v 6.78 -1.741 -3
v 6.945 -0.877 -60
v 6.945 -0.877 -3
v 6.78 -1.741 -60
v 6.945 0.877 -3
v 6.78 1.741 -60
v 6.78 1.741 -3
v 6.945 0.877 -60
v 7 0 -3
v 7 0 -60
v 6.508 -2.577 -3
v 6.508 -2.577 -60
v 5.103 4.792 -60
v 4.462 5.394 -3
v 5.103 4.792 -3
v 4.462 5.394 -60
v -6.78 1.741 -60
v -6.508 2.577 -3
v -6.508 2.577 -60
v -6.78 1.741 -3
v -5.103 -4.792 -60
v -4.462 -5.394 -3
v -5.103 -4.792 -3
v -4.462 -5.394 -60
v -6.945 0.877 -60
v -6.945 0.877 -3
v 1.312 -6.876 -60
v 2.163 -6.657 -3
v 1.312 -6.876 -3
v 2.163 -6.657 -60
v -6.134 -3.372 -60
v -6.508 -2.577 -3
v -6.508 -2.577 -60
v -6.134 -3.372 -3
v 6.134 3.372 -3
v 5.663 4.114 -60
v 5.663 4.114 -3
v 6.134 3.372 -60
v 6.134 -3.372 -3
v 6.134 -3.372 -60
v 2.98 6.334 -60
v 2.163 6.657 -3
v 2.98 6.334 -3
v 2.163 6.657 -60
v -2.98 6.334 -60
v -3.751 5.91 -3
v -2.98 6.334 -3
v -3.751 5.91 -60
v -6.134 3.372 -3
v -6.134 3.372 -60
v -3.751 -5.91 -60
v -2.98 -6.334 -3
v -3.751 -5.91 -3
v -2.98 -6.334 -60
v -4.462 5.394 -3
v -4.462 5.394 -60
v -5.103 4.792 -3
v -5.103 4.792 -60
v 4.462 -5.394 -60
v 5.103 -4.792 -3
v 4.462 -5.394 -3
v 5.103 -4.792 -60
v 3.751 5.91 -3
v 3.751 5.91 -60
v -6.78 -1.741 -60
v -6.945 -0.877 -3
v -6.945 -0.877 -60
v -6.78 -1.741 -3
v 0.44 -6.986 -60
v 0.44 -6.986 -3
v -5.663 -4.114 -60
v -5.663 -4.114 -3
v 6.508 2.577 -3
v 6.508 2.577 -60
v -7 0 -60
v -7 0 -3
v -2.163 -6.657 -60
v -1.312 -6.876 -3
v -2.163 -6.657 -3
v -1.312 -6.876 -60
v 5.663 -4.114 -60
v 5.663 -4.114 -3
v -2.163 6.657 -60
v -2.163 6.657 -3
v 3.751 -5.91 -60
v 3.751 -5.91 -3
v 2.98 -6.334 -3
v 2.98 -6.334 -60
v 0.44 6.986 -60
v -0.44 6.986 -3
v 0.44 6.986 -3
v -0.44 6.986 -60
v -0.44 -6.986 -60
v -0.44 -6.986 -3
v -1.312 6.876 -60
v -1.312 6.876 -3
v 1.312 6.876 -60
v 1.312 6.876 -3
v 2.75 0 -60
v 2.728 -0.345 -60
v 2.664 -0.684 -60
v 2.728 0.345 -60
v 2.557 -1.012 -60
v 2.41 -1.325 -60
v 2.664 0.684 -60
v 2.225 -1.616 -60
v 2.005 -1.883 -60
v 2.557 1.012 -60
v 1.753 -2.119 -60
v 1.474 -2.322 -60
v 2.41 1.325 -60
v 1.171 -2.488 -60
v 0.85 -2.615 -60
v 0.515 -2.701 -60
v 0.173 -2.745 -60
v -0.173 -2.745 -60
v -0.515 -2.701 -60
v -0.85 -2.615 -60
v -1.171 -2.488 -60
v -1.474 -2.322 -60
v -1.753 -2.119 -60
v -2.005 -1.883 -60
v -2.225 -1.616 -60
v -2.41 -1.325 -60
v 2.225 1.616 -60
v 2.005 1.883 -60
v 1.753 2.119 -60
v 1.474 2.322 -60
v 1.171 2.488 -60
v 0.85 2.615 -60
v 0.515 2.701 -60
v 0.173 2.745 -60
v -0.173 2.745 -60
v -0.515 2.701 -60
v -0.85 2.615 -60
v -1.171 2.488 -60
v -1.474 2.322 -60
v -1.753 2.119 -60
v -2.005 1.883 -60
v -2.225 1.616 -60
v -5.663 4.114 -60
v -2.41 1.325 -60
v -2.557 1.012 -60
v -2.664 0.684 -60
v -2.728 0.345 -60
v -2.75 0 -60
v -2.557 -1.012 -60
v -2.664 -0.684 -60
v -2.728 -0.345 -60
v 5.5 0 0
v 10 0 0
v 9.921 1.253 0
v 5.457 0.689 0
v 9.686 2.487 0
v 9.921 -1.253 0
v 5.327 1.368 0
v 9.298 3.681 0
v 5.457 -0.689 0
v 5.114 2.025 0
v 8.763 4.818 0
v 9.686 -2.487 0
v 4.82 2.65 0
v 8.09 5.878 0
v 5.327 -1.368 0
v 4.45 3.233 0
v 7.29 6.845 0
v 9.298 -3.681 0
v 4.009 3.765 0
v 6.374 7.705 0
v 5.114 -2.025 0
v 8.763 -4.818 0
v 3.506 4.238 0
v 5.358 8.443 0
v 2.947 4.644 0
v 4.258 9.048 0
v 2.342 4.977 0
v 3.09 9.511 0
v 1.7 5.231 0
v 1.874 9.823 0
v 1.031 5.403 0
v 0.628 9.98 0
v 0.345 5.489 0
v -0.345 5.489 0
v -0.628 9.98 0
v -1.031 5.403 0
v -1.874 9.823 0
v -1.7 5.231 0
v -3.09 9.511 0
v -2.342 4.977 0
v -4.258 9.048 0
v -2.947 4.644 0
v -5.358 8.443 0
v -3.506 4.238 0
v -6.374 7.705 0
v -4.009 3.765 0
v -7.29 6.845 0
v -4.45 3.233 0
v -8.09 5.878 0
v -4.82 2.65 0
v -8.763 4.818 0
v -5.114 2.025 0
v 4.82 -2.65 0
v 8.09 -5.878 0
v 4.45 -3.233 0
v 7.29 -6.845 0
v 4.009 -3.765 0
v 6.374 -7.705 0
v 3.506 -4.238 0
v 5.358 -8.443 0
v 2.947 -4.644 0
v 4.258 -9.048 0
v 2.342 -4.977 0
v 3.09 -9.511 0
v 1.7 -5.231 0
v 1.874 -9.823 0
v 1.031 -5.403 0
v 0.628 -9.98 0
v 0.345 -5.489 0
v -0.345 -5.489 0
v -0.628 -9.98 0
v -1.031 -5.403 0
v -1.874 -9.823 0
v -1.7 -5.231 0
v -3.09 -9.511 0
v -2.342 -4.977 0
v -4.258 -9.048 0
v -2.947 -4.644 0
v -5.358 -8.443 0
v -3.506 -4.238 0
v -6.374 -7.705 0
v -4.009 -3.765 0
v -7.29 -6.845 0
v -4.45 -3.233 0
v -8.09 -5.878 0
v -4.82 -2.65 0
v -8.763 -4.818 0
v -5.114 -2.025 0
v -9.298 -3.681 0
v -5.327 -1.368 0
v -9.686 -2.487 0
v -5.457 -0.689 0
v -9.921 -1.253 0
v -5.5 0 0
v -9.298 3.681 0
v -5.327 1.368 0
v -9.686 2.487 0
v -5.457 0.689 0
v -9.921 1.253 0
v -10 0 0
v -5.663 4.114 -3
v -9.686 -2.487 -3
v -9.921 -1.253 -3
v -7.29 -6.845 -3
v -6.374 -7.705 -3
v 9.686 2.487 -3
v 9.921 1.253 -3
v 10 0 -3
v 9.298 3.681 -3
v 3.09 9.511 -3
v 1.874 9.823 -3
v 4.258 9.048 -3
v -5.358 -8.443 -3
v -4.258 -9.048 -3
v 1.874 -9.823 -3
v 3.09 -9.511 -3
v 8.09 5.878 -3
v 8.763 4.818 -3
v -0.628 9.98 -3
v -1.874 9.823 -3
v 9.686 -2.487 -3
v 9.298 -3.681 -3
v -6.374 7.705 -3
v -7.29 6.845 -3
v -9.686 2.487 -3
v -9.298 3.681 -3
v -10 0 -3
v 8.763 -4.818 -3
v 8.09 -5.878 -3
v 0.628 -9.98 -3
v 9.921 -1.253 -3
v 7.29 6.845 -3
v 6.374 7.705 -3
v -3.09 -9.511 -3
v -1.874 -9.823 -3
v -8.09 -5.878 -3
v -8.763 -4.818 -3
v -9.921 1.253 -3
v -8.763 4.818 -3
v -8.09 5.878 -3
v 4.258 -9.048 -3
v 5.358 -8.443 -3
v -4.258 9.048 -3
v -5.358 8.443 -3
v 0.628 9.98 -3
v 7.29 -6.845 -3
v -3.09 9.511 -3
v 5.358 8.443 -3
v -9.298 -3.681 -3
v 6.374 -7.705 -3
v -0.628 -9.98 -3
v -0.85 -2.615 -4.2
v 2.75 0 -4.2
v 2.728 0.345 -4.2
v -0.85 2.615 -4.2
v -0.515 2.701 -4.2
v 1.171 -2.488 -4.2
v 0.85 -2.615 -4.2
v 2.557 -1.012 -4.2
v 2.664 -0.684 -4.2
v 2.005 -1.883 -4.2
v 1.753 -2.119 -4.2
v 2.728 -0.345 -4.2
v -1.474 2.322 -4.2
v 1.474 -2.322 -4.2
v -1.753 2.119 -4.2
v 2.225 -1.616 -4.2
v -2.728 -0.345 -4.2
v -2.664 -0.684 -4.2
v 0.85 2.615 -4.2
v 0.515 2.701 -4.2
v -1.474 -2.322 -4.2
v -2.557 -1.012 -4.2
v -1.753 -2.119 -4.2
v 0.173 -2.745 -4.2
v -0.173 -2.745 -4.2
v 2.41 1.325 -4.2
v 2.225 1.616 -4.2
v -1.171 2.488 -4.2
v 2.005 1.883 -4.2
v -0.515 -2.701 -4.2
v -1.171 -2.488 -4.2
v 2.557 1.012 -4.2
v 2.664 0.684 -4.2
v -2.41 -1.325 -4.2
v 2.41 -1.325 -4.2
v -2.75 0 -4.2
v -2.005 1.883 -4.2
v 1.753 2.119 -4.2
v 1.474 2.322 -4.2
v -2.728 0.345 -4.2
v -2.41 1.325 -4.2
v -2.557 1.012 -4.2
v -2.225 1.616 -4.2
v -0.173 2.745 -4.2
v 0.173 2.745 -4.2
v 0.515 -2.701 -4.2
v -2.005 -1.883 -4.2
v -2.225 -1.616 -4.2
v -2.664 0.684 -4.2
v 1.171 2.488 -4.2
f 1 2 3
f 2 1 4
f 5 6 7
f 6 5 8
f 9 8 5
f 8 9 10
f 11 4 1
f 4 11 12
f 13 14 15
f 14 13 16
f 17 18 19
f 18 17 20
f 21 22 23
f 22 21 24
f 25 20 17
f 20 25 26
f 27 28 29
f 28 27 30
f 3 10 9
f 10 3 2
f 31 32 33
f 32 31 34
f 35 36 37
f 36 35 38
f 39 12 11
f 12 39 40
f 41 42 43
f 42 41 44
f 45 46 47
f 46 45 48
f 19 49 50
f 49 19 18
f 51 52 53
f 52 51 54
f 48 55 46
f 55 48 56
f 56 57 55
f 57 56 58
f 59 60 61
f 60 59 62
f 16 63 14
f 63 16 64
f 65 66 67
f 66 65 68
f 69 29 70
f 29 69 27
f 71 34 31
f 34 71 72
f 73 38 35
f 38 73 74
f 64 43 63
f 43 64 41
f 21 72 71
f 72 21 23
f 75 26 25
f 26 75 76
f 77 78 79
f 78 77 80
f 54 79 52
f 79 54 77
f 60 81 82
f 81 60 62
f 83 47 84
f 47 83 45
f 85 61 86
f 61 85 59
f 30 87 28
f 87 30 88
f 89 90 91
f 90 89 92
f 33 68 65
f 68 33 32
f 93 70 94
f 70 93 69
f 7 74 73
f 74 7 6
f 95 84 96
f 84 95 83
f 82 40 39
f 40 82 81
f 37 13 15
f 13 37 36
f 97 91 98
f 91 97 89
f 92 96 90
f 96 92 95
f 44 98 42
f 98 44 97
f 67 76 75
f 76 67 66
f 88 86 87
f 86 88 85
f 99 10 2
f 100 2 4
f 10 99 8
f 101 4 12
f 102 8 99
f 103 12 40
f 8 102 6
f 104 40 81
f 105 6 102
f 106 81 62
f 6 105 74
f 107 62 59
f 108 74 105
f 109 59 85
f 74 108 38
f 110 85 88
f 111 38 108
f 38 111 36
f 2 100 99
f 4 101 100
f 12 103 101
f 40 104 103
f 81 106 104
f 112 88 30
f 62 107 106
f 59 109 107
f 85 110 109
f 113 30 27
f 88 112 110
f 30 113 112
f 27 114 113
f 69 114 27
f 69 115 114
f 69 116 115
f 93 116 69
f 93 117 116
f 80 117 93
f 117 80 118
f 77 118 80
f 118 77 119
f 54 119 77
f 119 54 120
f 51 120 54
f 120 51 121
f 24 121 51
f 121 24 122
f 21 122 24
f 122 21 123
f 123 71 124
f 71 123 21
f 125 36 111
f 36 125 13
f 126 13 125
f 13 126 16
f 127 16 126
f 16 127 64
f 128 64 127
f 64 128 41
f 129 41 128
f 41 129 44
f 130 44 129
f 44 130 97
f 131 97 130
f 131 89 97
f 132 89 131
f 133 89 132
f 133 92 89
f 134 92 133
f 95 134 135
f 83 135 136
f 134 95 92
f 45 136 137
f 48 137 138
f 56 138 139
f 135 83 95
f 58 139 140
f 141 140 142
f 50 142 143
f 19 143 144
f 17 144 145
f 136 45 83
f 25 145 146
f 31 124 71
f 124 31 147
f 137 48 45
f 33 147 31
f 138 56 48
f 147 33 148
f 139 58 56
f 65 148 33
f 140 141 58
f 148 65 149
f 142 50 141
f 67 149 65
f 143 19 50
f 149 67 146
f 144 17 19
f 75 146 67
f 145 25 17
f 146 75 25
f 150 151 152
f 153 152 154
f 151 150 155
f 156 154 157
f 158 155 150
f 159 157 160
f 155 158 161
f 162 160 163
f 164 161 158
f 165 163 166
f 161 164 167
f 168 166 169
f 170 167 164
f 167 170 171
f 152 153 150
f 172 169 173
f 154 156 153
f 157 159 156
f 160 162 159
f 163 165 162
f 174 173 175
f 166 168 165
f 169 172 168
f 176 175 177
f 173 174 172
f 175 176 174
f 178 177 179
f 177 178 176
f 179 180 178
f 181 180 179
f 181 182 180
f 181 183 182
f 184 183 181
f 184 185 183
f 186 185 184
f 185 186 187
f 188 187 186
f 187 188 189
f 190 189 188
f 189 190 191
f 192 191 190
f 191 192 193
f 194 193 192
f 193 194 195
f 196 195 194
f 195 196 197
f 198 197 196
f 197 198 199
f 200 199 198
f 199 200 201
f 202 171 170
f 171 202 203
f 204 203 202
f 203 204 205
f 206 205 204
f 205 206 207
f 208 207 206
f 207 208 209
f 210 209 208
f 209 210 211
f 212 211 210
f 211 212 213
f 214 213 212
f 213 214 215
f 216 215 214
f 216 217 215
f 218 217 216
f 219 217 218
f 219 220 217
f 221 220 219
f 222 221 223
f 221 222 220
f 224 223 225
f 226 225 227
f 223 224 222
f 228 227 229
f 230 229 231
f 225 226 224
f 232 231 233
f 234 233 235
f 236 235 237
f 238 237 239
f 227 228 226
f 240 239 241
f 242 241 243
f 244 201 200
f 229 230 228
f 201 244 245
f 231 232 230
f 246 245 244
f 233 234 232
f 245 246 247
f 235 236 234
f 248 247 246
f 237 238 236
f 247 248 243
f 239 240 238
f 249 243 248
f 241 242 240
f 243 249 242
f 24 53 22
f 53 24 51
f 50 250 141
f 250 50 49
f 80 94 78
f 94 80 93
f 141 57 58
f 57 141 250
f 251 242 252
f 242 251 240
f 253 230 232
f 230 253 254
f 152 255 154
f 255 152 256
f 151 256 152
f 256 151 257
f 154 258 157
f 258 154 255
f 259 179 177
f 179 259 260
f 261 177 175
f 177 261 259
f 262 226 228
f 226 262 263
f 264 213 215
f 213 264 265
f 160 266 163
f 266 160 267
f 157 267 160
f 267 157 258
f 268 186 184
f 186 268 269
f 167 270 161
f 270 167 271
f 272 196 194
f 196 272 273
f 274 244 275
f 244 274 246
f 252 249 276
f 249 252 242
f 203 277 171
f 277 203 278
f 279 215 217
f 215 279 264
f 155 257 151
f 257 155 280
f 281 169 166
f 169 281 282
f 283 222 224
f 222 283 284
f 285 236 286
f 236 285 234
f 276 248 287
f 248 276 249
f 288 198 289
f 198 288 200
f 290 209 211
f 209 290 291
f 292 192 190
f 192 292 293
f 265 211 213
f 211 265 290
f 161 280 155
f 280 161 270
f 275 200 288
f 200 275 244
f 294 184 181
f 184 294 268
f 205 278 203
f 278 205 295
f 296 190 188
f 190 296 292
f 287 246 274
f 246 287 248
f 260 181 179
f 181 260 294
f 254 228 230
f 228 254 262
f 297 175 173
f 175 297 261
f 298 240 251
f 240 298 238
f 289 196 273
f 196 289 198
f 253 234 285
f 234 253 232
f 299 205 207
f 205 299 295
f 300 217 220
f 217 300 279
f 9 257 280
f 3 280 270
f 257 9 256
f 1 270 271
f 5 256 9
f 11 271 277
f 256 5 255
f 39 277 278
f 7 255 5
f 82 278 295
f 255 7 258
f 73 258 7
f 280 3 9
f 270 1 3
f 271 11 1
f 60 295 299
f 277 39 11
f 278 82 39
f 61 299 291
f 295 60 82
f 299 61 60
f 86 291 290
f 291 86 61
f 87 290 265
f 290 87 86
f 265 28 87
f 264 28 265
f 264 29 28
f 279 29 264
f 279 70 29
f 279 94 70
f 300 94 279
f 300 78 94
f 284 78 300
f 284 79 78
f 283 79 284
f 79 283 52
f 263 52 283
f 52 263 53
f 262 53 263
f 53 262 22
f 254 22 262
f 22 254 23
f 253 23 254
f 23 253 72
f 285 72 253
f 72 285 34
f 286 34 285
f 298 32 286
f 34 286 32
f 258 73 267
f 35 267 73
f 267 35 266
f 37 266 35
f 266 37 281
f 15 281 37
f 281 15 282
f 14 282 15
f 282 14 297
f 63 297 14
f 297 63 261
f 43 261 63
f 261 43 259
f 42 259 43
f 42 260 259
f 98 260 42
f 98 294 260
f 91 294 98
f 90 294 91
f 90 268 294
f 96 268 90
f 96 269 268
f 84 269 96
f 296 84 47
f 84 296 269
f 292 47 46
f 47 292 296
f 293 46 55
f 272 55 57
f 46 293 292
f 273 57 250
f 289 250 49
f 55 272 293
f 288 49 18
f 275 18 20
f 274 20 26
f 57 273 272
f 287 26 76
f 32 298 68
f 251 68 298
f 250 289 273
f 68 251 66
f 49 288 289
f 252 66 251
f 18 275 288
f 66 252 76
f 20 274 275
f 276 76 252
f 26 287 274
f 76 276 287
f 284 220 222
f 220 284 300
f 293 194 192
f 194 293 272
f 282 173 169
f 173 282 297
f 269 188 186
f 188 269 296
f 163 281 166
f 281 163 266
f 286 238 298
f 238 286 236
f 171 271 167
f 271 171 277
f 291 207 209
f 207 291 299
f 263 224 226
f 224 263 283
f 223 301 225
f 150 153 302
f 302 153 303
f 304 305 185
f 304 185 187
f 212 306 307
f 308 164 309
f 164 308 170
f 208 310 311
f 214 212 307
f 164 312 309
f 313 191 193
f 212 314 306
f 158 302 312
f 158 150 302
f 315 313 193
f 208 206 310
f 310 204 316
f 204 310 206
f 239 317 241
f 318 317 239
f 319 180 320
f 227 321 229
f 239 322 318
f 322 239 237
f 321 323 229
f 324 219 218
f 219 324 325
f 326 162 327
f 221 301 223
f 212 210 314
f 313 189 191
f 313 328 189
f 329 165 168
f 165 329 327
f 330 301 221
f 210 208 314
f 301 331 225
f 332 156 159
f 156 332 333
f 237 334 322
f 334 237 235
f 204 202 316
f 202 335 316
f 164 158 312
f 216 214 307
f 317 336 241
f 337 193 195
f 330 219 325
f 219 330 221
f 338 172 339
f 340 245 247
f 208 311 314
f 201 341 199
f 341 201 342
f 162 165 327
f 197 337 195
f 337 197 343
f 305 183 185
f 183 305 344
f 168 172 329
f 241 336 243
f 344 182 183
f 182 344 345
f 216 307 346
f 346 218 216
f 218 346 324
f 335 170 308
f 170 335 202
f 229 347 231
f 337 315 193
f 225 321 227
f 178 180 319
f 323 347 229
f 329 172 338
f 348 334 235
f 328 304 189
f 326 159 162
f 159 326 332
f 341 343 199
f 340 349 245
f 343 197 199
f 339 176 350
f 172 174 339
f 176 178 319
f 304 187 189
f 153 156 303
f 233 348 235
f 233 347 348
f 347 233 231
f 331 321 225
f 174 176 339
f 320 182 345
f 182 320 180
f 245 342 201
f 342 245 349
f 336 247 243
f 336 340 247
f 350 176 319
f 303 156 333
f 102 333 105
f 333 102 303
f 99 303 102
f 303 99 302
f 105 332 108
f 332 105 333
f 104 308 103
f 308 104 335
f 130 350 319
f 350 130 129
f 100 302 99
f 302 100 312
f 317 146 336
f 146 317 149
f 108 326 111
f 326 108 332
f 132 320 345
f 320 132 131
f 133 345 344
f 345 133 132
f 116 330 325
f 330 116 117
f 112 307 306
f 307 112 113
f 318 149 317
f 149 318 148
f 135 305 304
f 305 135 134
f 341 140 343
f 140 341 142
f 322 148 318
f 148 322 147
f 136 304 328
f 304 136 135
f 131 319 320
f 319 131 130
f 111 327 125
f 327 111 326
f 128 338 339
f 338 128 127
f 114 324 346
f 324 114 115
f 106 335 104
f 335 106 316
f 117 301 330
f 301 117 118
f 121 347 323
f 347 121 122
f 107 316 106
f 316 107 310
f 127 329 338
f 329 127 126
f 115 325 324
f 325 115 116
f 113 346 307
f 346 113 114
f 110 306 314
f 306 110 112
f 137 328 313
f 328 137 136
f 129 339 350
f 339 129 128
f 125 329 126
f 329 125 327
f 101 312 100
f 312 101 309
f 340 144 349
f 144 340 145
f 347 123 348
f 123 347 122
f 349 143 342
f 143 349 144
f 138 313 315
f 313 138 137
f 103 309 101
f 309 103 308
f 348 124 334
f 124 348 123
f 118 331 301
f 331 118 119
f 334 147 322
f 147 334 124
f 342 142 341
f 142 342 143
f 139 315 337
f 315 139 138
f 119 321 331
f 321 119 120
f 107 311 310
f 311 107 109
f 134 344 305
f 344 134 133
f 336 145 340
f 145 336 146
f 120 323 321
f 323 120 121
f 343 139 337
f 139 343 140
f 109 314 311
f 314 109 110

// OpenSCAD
$fn = 50;


difference() {
	union() {
		translate(v = [0, 0, -60.0000000000]) {
			cylinder(h = 60, r = 7.0000000000);
		}
		translate(v = [0, 0, -3.0000000000]) {
			cylinder(h = 3, r = 10.0000000000);
		}
	}
	union() {
		translate(v = [0, 0, 0]) {
			rotate(a = [0, 0, 0]) {
				difference() {
					union() {
						#translate(v = [0, 0, -60.0000000000]) {
							cylinder(h = 60, r = 2.2500000000);
						}
						#translate(v = [0, 0, -4.2000000000]) {
							cylinder(h = 4.2000000000, r = 7.0000000000, r1 = 2.7500000000, r2 = 5.5000000000);
						}
						#translate(v = [0, 0, -60.0000000000]) {
							cylinder(h = 60, r = 2.7500000000);
						}
						#translate(v = [0, 0, -60.0000000000]) {
							cylinder(h = 60, r = 2.2500000000);
						}
					}
					union();
				}
			}
		}
	}
}
